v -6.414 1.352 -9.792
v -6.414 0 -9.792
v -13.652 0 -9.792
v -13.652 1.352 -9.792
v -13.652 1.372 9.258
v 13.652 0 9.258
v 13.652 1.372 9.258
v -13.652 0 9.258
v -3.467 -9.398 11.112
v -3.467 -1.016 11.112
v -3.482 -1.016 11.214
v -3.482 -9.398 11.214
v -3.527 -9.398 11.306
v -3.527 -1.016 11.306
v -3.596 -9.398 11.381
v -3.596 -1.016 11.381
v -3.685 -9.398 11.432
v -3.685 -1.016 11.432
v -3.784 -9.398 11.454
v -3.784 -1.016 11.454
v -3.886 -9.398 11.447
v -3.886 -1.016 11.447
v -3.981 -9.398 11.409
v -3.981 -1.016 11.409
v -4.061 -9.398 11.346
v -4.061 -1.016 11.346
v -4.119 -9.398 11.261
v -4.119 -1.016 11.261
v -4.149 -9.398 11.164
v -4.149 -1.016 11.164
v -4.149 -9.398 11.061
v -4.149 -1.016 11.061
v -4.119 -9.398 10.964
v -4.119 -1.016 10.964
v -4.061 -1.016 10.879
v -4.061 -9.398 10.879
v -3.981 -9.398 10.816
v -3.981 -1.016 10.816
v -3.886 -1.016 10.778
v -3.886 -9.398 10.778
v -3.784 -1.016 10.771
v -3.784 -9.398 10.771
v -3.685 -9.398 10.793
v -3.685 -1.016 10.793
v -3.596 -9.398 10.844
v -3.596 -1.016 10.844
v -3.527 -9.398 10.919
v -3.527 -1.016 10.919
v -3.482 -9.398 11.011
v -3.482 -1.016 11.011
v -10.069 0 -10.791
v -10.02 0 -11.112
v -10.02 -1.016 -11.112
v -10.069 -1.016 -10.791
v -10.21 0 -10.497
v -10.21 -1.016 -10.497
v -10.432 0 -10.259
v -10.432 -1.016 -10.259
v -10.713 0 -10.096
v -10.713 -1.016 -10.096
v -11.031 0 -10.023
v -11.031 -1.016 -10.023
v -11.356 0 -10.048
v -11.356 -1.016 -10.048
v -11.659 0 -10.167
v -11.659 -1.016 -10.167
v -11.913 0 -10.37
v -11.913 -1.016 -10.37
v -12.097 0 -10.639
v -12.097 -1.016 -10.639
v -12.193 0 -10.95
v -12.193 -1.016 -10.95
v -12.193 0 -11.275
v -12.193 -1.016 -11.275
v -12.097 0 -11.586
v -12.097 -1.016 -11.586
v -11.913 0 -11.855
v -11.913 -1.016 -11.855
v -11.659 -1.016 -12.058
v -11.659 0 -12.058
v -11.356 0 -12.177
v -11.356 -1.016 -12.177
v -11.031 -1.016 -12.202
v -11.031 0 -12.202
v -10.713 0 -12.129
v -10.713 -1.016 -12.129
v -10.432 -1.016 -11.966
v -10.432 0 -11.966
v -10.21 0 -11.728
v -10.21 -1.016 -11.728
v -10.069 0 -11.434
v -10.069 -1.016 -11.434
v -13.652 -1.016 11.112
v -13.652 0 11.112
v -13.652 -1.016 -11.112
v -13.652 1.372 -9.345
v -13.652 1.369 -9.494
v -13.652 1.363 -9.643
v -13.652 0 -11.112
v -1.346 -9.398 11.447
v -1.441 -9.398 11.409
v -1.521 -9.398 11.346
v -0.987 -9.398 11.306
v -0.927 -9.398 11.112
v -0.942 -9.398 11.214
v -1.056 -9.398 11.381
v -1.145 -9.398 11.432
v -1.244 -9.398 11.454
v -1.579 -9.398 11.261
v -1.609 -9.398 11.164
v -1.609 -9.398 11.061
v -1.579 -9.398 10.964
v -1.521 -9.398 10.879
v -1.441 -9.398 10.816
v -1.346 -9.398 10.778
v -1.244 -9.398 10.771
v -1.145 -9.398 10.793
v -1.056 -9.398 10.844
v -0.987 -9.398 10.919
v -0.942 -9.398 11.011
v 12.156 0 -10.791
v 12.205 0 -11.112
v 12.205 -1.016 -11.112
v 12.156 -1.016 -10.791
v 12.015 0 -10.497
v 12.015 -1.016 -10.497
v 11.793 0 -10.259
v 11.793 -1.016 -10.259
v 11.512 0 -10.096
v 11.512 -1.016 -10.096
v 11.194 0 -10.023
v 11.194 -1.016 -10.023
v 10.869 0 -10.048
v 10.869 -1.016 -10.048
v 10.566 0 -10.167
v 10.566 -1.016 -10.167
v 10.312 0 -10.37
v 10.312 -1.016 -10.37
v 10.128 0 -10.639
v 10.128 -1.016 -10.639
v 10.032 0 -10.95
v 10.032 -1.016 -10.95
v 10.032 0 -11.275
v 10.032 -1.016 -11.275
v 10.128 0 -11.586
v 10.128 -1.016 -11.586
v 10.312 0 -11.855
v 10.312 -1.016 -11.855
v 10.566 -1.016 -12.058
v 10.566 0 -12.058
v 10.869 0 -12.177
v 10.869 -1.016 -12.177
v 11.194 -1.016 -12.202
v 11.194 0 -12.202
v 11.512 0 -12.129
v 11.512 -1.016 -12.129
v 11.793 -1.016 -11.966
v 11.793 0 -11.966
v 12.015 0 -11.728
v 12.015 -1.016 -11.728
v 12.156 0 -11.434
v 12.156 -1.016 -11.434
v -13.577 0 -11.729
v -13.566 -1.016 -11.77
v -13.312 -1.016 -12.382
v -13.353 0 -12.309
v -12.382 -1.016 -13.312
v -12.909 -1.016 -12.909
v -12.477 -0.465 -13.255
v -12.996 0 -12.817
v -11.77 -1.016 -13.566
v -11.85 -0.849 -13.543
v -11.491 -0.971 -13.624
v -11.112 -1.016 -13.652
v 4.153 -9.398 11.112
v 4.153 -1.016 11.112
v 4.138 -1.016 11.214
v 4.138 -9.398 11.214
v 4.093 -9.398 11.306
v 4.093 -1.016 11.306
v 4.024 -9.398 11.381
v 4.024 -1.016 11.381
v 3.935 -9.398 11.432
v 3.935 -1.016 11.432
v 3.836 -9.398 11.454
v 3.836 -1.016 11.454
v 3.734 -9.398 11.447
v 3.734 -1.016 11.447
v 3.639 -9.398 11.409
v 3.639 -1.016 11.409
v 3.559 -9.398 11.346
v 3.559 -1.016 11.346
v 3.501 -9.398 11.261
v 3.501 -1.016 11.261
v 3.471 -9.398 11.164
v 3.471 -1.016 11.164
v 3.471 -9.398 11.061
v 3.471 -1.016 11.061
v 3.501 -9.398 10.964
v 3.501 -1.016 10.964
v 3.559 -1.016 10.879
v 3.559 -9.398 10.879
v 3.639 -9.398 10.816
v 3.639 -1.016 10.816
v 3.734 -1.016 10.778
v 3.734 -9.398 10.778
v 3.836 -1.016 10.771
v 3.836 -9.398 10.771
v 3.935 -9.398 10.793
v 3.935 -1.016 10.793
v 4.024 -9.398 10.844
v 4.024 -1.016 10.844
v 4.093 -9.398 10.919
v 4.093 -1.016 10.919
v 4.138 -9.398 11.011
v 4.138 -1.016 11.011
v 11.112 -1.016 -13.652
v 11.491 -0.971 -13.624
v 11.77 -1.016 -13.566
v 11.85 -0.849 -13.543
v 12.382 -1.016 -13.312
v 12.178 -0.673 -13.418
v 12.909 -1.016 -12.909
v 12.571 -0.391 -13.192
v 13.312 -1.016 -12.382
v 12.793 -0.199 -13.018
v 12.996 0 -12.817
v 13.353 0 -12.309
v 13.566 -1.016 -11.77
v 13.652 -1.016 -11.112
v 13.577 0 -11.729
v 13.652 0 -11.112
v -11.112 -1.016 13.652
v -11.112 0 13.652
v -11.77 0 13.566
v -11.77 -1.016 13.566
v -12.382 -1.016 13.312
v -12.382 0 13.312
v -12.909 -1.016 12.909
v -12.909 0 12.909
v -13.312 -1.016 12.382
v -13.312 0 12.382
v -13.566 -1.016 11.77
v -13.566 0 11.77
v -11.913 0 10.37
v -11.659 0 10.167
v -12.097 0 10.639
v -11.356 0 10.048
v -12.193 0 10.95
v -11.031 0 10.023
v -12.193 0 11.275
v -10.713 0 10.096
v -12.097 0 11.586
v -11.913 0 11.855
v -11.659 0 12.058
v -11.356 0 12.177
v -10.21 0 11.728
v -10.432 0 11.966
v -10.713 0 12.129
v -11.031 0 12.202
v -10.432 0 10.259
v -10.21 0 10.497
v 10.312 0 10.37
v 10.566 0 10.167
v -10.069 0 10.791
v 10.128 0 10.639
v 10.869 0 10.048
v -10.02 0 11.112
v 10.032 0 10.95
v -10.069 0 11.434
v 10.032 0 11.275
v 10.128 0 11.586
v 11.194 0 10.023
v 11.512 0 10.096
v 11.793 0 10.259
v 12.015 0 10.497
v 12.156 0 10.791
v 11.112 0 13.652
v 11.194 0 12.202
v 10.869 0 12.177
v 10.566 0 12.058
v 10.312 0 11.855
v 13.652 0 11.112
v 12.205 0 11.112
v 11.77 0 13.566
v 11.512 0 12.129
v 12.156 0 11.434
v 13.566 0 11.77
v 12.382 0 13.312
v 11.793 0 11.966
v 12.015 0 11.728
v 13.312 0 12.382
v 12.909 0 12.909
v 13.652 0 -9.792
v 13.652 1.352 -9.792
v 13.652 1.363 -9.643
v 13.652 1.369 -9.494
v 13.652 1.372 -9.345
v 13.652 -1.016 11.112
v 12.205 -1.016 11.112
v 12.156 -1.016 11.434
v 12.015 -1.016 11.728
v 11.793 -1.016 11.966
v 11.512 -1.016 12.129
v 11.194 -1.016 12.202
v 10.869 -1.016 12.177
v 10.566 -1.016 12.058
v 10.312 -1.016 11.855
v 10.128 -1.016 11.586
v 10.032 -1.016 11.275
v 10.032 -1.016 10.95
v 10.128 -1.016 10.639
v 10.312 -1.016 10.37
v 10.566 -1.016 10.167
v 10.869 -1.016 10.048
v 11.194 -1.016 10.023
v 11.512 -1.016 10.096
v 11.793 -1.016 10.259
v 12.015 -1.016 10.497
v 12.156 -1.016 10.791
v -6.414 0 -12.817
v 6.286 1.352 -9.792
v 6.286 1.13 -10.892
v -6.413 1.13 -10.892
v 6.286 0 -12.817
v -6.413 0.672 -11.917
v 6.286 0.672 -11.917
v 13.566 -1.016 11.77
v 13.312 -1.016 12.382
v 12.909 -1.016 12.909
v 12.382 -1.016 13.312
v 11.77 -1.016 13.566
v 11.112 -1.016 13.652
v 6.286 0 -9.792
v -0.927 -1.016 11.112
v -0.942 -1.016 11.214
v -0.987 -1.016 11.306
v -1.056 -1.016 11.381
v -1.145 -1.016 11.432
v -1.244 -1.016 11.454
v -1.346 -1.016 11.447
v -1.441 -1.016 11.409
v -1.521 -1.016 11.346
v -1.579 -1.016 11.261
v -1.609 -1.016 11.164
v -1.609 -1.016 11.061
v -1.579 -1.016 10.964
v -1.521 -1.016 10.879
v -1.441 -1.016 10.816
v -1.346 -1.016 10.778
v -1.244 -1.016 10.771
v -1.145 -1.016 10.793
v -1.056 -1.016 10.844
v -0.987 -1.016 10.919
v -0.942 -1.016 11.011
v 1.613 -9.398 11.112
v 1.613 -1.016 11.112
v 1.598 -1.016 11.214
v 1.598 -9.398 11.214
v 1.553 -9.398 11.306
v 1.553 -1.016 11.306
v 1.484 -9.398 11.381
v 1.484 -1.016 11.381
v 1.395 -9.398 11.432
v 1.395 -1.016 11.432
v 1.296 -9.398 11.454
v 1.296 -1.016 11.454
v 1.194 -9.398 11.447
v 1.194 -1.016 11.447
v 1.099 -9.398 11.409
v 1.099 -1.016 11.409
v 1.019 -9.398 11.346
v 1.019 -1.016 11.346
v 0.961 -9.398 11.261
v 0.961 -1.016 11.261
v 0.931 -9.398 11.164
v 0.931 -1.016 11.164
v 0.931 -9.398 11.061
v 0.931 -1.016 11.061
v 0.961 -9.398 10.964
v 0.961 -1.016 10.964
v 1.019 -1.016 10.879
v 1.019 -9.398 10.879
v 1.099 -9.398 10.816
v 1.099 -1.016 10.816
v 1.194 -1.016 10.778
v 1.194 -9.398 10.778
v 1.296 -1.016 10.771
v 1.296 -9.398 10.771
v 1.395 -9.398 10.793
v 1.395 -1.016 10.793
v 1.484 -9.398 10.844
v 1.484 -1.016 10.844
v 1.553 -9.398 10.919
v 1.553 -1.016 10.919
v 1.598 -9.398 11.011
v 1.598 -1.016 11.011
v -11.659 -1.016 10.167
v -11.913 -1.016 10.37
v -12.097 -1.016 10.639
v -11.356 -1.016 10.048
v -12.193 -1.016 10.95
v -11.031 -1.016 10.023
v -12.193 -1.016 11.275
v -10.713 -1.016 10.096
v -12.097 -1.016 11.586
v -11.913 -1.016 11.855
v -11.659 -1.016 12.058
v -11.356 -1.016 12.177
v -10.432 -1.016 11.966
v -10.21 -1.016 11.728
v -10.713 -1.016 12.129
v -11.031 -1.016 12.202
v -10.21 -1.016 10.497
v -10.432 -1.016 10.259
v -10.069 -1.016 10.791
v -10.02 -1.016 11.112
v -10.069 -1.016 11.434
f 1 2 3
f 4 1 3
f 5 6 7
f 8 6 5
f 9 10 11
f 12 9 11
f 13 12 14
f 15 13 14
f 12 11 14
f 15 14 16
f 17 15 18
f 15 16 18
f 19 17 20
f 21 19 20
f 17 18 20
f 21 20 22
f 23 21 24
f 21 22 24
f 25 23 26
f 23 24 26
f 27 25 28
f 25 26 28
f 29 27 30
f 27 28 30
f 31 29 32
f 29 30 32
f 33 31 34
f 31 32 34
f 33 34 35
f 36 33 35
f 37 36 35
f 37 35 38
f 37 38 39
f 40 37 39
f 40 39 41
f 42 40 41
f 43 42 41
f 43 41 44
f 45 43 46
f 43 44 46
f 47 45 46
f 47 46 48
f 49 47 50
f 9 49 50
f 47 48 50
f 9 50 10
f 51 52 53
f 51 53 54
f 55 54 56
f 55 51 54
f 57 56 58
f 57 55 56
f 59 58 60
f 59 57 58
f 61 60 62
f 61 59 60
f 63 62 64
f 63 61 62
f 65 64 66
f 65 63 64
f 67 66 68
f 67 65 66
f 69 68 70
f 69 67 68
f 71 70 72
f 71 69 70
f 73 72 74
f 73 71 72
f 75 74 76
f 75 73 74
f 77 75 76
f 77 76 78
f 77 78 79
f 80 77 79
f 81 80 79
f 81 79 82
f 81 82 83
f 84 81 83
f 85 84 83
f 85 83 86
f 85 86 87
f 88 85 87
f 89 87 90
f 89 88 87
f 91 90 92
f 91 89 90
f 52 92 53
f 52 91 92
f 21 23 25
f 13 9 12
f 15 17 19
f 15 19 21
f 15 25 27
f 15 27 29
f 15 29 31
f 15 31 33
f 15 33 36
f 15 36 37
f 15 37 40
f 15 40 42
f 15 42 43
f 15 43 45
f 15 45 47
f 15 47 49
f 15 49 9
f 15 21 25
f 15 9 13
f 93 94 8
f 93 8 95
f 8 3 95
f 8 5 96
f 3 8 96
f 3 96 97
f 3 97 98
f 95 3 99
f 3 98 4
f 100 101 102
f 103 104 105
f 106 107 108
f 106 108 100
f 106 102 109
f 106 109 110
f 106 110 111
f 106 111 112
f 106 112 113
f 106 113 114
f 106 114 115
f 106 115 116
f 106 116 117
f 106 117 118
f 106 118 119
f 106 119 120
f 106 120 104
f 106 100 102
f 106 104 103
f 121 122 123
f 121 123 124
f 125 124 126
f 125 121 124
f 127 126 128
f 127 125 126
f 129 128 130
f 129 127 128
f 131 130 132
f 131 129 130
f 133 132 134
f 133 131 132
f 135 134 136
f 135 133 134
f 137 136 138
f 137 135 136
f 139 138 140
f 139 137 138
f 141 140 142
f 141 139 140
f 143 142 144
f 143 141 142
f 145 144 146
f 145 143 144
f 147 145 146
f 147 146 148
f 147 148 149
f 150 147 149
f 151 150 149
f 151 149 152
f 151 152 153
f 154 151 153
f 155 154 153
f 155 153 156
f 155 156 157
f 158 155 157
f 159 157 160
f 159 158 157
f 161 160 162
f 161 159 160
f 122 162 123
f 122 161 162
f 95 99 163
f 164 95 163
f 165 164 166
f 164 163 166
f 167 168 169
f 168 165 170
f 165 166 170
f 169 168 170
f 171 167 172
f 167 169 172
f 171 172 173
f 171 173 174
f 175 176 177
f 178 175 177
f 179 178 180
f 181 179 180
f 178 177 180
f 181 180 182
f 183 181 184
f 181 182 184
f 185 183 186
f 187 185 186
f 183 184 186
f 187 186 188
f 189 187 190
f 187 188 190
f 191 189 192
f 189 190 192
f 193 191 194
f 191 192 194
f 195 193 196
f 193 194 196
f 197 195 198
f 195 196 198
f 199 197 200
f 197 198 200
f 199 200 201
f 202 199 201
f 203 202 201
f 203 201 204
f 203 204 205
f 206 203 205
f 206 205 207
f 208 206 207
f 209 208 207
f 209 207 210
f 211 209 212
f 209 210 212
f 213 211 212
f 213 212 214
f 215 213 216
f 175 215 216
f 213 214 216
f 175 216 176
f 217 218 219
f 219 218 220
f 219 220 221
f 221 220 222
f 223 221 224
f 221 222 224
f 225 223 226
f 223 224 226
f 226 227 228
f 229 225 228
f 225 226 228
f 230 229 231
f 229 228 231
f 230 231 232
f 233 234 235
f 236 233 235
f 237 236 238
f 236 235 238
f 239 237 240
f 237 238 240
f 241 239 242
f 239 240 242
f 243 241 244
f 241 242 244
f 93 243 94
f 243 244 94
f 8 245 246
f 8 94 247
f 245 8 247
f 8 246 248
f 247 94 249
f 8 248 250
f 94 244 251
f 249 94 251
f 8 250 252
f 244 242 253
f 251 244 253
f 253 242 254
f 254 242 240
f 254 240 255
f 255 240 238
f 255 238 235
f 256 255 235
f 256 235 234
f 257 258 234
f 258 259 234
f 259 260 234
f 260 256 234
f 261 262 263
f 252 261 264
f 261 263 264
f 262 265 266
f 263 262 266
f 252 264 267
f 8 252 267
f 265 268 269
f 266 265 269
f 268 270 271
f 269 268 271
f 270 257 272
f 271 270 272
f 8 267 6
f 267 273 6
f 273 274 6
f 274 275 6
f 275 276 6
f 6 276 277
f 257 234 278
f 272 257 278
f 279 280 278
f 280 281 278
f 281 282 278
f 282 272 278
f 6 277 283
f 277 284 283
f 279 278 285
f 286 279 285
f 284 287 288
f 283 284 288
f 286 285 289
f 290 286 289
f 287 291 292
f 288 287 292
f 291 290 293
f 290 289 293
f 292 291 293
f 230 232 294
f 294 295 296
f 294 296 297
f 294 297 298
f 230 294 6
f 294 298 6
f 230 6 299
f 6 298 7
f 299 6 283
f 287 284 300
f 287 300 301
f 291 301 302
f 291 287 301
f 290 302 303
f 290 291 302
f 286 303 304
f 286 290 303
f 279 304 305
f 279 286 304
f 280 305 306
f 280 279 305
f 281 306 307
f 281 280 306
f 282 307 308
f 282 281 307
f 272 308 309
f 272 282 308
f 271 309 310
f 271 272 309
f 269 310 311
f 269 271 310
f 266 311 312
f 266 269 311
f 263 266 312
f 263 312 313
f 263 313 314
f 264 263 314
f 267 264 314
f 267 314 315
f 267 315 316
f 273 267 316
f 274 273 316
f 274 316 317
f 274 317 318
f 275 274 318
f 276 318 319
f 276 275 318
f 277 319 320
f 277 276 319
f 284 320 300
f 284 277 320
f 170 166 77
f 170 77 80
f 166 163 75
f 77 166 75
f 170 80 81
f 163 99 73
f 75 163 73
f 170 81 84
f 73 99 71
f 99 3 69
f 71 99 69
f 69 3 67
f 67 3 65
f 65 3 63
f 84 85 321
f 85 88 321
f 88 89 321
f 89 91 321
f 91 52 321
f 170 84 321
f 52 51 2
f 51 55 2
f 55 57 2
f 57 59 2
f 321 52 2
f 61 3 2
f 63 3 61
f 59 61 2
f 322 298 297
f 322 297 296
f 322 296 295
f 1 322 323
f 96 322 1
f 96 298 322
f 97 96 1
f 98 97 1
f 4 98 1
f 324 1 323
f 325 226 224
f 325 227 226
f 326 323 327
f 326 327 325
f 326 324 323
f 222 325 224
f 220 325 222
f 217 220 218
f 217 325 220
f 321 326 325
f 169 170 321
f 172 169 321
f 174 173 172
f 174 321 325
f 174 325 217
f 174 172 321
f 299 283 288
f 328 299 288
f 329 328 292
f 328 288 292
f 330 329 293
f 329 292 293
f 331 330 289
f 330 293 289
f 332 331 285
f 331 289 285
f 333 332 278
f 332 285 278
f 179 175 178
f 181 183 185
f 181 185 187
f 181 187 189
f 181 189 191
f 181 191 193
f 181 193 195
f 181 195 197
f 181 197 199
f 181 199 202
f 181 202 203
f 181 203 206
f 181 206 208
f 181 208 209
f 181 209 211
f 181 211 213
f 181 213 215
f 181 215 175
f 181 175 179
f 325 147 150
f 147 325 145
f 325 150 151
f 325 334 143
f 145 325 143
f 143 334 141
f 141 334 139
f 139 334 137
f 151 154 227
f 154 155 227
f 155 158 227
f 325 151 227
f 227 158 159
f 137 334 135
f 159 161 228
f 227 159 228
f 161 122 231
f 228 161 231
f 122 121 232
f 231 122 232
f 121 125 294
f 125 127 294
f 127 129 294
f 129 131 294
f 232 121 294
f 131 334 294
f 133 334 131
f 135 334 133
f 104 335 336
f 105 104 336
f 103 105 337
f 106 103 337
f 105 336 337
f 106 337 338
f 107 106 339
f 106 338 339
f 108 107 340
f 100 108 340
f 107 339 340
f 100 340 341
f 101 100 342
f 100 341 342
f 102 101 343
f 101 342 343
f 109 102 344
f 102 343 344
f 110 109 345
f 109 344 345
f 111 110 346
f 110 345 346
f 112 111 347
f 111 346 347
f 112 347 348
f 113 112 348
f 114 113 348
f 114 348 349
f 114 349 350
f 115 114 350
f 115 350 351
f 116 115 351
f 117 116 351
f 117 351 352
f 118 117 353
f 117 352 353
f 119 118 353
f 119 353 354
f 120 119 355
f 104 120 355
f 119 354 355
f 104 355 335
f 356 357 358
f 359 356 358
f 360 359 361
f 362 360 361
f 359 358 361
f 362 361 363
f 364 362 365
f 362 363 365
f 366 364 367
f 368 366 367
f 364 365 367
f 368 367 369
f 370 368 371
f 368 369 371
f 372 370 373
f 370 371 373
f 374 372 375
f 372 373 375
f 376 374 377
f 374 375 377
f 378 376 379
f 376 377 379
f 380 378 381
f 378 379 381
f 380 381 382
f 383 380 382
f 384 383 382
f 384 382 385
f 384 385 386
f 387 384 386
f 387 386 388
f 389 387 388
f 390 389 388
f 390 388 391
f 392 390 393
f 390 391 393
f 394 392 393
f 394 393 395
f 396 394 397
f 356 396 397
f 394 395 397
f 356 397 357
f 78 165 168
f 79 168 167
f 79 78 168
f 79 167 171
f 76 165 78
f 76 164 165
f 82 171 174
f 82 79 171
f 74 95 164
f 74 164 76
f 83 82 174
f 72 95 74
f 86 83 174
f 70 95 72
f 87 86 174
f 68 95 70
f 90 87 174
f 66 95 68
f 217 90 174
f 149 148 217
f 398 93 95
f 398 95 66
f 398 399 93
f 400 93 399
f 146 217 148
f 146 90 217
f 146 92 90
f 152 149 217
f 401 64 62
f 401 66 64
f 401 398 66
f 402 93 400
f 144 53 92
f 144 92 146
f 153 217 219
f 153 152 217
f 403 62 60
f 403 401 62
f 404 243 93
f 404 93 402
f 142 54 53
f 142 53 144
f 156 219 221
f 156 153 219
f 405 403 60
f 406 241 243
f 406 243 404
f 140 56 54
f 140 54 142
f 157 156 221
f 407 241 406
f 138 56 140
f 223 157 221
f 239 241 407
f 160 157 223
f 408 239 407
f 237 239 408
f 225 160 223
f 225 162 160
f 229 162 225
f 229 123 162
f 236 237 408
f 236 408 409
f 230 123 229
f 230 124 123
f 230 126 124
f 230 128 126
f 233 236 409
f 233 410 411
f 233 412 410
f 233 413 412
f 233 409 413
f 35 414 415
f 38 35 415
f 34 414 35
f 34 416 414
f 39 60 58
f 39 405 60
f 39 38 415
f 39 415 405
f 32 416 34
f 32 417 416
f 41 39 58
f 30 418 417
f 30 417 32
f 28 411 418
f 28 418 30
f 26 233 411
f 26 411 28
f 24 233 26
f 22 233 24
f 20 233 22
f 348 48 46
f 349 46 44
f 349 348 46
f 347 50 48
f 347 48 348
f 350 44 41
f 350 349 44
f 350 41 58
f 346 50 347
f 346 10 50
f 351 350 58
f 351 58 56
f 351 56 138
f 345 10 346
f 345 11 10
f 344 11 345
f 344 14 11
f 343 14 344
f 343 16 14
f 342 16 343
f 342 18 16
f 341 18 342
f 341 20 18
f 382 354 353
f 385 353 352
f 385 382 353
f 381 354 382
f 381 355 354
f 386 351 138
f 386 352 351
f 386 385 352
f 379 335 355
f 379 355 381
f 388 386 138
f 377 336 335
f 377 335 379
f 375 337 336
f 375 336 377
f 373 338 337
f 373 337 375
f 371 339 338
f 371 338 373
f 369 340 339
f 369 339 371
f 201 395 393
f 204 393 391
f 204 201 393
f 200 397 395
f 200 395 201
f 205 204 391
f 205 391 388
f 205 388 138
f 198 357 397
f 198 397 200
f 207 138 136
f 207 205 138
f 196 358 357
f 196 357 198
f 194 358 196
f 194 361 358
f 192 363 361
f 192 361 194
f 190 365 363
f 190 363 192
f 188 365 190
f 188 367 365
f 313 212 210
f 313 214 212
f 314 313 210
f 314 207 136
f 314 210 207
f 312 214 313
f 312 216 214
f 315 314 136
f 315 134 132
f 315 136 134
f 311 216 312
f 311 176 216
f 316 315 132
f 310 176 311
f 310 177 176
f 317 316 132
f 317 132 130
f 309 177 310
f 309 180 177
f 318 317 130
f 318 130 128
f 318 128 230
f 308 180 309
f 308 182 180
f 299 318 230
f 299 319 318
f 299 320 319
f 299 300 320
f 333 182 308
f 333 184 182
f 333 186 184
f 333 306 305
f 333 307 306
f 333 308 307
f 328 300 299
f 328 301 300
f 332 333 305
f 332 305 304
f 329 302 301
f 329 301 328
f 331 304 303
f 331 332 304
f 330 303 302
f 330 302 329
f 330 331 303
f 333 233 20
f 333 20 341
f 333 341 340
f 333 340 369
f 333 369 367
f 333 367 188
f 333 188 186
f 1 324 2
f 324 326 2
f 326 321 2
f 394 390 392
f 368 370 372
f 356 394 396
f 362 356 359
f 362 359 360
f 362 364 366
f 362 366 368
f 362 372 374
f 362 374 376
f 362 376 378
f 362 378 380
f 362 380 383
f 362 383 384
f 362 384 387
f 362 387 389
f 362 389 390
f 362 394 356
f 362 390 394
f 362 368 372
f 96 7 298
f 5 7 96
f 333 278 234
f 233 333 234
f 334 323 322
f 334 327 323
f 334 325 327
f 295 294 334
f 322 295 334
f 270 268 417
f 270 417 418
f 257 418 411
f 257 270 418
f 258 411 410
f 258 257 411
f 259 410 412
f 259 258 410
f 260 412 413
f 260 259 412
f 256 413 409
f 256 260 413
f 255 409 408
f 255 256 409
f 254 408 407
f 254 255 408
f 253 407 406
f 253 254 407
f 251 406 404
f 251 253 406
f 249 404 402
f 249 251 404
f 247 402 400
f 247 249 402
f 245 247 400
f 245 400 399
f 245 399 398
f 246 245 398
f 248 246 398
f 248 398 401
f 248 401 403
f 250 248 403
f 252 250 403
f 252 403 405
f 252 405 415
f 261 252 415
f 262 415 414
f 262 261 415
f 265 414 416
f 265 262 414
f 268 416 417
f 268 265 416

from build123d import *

# Parameters (mm, degrees)
F0_R        = 1.0922
F1_DEPTH    = 1.016
F2_R        = 0.3429
F3_DEPTH    = 8.382
F4_W        = 27.305
F4_H        = 19.05
F5_DEPTH    = 1.3716
F6_W        = 12.7
F6_H        = 3.8608
F7_DEPTH    = 1.3716
F8_T1_DEPTH = 34.2391400943


# Not quite as in the source:
# - a fillet or chamfer that OpenCascade refuses, or shapes differently, is made with other operations: its cross-section is extruded or revolved along the edge and cut away or added


with BuildPart() as f1:
    # F0 (on Front) → F1 (new body)
    with BuildSketch(Plane.XZ):
        with BuildLine():
            Line((11.1125, 13.6525), (-11.1125, 13.6525))
            ThreePointArc((-11.1125, 13.6525), (-12.9085512242, 12.9085512242), (-13.6525, 11.1125))
            Line((-13.6525, 11.1125), (-13.6525, -11.1125))
            ThreePointArc((-13.6525, -11.1125), (-12.9085512242, -12.9085512242), (-11.1125, -13.6525))
            Line((-11.1125, -13.6525), (11.1125, -13.6525))
            ThreePointArc((11.1125, -13.6525), (12.9085512242, -12.9085512242), (13.6525, -11.1125))
            Line((13.6525, -11.1125), (13.6525, 11.1125))
            ThreePointArc((13.6525, 11.1125), (12.9085512242, 12.9085512242), (11.1125, 13.6525))
        make_face()
        with Locations((-11.1125, -11.1125)):
            Circle(F0_R, mode=Mode.SUBTRACT)
        with Locations((11.1125, -11.1125)):
            Circle(F0_R, mode=Mode.SUBTRACT)
        with Locations((-11.1125, 11.1125)):
            Circle(F0_R, mode=Mode.SUBTRACT)
        with Locations((11.1125, 11.1125)):
            Circle(F0_R, mode=Mode.SUBTRACT)
    extrude(amount=F1_DEPTH)

    # F2 (on face) → F3 (join)
    with BuildSketch(Plane.XZ.offset(1.016)):
        with Locations((-3.81, 11.1125)):
            Circle(F2_R)
        with Locations((-1.27, 11.1125)):
            Circle(F2_R)
        with Locations((3.81, 11.1125)):
            Circle(F2_R)
        with Locations((1.27, 11.1125)):
            Circle(F2_R)
    extrude(amount=F3_DEPTH)

    # F4 (on face) → F5 (join)
    with BuildSketch(Plane(origin=(0, 0, 0), x_dir=(-1, 0, 0), z_dir=(0, 1, 0))):
        with Locations((0, -0.2667)):
            Rectangle(F4_W, F4_H)
    extrude(amount=F5_DEPTH)

    # F6 (on face) → F7 (join, through all)
    with BuildSketch(Plane(origin=(0, 0, 0), x_dir=(-1, 0, 0), z_dir=(0, 1, 0))):
        with Locations((0.0635, -11.7221)):
            Rectangle(F6_W, F6_H)
    extrude(amount=F7_DEPTH)

    # F8: fillet of radius 5.08 on 1 edges, made by hand

    # F8_s2 → F8_t1 (cut)
    with BuildSketch(Plane.YZ.offset(-17.1830700471)):
        with BuildLine():
            ThreePointArc((1.3716, -9.3446719811), (0.7347853439, -11.8072933487), (-1.016, -13.6525))
            Line((-1.016, -13.6525), (1.3716, -13.6525))
            Line((1.3716, -13.6525), (1.3716, -9.3446719811))
        make_face()
    extrude(amount=F8_T1_DEPTH, mode=Mode.SUBTRACT)


solid = f1.part
